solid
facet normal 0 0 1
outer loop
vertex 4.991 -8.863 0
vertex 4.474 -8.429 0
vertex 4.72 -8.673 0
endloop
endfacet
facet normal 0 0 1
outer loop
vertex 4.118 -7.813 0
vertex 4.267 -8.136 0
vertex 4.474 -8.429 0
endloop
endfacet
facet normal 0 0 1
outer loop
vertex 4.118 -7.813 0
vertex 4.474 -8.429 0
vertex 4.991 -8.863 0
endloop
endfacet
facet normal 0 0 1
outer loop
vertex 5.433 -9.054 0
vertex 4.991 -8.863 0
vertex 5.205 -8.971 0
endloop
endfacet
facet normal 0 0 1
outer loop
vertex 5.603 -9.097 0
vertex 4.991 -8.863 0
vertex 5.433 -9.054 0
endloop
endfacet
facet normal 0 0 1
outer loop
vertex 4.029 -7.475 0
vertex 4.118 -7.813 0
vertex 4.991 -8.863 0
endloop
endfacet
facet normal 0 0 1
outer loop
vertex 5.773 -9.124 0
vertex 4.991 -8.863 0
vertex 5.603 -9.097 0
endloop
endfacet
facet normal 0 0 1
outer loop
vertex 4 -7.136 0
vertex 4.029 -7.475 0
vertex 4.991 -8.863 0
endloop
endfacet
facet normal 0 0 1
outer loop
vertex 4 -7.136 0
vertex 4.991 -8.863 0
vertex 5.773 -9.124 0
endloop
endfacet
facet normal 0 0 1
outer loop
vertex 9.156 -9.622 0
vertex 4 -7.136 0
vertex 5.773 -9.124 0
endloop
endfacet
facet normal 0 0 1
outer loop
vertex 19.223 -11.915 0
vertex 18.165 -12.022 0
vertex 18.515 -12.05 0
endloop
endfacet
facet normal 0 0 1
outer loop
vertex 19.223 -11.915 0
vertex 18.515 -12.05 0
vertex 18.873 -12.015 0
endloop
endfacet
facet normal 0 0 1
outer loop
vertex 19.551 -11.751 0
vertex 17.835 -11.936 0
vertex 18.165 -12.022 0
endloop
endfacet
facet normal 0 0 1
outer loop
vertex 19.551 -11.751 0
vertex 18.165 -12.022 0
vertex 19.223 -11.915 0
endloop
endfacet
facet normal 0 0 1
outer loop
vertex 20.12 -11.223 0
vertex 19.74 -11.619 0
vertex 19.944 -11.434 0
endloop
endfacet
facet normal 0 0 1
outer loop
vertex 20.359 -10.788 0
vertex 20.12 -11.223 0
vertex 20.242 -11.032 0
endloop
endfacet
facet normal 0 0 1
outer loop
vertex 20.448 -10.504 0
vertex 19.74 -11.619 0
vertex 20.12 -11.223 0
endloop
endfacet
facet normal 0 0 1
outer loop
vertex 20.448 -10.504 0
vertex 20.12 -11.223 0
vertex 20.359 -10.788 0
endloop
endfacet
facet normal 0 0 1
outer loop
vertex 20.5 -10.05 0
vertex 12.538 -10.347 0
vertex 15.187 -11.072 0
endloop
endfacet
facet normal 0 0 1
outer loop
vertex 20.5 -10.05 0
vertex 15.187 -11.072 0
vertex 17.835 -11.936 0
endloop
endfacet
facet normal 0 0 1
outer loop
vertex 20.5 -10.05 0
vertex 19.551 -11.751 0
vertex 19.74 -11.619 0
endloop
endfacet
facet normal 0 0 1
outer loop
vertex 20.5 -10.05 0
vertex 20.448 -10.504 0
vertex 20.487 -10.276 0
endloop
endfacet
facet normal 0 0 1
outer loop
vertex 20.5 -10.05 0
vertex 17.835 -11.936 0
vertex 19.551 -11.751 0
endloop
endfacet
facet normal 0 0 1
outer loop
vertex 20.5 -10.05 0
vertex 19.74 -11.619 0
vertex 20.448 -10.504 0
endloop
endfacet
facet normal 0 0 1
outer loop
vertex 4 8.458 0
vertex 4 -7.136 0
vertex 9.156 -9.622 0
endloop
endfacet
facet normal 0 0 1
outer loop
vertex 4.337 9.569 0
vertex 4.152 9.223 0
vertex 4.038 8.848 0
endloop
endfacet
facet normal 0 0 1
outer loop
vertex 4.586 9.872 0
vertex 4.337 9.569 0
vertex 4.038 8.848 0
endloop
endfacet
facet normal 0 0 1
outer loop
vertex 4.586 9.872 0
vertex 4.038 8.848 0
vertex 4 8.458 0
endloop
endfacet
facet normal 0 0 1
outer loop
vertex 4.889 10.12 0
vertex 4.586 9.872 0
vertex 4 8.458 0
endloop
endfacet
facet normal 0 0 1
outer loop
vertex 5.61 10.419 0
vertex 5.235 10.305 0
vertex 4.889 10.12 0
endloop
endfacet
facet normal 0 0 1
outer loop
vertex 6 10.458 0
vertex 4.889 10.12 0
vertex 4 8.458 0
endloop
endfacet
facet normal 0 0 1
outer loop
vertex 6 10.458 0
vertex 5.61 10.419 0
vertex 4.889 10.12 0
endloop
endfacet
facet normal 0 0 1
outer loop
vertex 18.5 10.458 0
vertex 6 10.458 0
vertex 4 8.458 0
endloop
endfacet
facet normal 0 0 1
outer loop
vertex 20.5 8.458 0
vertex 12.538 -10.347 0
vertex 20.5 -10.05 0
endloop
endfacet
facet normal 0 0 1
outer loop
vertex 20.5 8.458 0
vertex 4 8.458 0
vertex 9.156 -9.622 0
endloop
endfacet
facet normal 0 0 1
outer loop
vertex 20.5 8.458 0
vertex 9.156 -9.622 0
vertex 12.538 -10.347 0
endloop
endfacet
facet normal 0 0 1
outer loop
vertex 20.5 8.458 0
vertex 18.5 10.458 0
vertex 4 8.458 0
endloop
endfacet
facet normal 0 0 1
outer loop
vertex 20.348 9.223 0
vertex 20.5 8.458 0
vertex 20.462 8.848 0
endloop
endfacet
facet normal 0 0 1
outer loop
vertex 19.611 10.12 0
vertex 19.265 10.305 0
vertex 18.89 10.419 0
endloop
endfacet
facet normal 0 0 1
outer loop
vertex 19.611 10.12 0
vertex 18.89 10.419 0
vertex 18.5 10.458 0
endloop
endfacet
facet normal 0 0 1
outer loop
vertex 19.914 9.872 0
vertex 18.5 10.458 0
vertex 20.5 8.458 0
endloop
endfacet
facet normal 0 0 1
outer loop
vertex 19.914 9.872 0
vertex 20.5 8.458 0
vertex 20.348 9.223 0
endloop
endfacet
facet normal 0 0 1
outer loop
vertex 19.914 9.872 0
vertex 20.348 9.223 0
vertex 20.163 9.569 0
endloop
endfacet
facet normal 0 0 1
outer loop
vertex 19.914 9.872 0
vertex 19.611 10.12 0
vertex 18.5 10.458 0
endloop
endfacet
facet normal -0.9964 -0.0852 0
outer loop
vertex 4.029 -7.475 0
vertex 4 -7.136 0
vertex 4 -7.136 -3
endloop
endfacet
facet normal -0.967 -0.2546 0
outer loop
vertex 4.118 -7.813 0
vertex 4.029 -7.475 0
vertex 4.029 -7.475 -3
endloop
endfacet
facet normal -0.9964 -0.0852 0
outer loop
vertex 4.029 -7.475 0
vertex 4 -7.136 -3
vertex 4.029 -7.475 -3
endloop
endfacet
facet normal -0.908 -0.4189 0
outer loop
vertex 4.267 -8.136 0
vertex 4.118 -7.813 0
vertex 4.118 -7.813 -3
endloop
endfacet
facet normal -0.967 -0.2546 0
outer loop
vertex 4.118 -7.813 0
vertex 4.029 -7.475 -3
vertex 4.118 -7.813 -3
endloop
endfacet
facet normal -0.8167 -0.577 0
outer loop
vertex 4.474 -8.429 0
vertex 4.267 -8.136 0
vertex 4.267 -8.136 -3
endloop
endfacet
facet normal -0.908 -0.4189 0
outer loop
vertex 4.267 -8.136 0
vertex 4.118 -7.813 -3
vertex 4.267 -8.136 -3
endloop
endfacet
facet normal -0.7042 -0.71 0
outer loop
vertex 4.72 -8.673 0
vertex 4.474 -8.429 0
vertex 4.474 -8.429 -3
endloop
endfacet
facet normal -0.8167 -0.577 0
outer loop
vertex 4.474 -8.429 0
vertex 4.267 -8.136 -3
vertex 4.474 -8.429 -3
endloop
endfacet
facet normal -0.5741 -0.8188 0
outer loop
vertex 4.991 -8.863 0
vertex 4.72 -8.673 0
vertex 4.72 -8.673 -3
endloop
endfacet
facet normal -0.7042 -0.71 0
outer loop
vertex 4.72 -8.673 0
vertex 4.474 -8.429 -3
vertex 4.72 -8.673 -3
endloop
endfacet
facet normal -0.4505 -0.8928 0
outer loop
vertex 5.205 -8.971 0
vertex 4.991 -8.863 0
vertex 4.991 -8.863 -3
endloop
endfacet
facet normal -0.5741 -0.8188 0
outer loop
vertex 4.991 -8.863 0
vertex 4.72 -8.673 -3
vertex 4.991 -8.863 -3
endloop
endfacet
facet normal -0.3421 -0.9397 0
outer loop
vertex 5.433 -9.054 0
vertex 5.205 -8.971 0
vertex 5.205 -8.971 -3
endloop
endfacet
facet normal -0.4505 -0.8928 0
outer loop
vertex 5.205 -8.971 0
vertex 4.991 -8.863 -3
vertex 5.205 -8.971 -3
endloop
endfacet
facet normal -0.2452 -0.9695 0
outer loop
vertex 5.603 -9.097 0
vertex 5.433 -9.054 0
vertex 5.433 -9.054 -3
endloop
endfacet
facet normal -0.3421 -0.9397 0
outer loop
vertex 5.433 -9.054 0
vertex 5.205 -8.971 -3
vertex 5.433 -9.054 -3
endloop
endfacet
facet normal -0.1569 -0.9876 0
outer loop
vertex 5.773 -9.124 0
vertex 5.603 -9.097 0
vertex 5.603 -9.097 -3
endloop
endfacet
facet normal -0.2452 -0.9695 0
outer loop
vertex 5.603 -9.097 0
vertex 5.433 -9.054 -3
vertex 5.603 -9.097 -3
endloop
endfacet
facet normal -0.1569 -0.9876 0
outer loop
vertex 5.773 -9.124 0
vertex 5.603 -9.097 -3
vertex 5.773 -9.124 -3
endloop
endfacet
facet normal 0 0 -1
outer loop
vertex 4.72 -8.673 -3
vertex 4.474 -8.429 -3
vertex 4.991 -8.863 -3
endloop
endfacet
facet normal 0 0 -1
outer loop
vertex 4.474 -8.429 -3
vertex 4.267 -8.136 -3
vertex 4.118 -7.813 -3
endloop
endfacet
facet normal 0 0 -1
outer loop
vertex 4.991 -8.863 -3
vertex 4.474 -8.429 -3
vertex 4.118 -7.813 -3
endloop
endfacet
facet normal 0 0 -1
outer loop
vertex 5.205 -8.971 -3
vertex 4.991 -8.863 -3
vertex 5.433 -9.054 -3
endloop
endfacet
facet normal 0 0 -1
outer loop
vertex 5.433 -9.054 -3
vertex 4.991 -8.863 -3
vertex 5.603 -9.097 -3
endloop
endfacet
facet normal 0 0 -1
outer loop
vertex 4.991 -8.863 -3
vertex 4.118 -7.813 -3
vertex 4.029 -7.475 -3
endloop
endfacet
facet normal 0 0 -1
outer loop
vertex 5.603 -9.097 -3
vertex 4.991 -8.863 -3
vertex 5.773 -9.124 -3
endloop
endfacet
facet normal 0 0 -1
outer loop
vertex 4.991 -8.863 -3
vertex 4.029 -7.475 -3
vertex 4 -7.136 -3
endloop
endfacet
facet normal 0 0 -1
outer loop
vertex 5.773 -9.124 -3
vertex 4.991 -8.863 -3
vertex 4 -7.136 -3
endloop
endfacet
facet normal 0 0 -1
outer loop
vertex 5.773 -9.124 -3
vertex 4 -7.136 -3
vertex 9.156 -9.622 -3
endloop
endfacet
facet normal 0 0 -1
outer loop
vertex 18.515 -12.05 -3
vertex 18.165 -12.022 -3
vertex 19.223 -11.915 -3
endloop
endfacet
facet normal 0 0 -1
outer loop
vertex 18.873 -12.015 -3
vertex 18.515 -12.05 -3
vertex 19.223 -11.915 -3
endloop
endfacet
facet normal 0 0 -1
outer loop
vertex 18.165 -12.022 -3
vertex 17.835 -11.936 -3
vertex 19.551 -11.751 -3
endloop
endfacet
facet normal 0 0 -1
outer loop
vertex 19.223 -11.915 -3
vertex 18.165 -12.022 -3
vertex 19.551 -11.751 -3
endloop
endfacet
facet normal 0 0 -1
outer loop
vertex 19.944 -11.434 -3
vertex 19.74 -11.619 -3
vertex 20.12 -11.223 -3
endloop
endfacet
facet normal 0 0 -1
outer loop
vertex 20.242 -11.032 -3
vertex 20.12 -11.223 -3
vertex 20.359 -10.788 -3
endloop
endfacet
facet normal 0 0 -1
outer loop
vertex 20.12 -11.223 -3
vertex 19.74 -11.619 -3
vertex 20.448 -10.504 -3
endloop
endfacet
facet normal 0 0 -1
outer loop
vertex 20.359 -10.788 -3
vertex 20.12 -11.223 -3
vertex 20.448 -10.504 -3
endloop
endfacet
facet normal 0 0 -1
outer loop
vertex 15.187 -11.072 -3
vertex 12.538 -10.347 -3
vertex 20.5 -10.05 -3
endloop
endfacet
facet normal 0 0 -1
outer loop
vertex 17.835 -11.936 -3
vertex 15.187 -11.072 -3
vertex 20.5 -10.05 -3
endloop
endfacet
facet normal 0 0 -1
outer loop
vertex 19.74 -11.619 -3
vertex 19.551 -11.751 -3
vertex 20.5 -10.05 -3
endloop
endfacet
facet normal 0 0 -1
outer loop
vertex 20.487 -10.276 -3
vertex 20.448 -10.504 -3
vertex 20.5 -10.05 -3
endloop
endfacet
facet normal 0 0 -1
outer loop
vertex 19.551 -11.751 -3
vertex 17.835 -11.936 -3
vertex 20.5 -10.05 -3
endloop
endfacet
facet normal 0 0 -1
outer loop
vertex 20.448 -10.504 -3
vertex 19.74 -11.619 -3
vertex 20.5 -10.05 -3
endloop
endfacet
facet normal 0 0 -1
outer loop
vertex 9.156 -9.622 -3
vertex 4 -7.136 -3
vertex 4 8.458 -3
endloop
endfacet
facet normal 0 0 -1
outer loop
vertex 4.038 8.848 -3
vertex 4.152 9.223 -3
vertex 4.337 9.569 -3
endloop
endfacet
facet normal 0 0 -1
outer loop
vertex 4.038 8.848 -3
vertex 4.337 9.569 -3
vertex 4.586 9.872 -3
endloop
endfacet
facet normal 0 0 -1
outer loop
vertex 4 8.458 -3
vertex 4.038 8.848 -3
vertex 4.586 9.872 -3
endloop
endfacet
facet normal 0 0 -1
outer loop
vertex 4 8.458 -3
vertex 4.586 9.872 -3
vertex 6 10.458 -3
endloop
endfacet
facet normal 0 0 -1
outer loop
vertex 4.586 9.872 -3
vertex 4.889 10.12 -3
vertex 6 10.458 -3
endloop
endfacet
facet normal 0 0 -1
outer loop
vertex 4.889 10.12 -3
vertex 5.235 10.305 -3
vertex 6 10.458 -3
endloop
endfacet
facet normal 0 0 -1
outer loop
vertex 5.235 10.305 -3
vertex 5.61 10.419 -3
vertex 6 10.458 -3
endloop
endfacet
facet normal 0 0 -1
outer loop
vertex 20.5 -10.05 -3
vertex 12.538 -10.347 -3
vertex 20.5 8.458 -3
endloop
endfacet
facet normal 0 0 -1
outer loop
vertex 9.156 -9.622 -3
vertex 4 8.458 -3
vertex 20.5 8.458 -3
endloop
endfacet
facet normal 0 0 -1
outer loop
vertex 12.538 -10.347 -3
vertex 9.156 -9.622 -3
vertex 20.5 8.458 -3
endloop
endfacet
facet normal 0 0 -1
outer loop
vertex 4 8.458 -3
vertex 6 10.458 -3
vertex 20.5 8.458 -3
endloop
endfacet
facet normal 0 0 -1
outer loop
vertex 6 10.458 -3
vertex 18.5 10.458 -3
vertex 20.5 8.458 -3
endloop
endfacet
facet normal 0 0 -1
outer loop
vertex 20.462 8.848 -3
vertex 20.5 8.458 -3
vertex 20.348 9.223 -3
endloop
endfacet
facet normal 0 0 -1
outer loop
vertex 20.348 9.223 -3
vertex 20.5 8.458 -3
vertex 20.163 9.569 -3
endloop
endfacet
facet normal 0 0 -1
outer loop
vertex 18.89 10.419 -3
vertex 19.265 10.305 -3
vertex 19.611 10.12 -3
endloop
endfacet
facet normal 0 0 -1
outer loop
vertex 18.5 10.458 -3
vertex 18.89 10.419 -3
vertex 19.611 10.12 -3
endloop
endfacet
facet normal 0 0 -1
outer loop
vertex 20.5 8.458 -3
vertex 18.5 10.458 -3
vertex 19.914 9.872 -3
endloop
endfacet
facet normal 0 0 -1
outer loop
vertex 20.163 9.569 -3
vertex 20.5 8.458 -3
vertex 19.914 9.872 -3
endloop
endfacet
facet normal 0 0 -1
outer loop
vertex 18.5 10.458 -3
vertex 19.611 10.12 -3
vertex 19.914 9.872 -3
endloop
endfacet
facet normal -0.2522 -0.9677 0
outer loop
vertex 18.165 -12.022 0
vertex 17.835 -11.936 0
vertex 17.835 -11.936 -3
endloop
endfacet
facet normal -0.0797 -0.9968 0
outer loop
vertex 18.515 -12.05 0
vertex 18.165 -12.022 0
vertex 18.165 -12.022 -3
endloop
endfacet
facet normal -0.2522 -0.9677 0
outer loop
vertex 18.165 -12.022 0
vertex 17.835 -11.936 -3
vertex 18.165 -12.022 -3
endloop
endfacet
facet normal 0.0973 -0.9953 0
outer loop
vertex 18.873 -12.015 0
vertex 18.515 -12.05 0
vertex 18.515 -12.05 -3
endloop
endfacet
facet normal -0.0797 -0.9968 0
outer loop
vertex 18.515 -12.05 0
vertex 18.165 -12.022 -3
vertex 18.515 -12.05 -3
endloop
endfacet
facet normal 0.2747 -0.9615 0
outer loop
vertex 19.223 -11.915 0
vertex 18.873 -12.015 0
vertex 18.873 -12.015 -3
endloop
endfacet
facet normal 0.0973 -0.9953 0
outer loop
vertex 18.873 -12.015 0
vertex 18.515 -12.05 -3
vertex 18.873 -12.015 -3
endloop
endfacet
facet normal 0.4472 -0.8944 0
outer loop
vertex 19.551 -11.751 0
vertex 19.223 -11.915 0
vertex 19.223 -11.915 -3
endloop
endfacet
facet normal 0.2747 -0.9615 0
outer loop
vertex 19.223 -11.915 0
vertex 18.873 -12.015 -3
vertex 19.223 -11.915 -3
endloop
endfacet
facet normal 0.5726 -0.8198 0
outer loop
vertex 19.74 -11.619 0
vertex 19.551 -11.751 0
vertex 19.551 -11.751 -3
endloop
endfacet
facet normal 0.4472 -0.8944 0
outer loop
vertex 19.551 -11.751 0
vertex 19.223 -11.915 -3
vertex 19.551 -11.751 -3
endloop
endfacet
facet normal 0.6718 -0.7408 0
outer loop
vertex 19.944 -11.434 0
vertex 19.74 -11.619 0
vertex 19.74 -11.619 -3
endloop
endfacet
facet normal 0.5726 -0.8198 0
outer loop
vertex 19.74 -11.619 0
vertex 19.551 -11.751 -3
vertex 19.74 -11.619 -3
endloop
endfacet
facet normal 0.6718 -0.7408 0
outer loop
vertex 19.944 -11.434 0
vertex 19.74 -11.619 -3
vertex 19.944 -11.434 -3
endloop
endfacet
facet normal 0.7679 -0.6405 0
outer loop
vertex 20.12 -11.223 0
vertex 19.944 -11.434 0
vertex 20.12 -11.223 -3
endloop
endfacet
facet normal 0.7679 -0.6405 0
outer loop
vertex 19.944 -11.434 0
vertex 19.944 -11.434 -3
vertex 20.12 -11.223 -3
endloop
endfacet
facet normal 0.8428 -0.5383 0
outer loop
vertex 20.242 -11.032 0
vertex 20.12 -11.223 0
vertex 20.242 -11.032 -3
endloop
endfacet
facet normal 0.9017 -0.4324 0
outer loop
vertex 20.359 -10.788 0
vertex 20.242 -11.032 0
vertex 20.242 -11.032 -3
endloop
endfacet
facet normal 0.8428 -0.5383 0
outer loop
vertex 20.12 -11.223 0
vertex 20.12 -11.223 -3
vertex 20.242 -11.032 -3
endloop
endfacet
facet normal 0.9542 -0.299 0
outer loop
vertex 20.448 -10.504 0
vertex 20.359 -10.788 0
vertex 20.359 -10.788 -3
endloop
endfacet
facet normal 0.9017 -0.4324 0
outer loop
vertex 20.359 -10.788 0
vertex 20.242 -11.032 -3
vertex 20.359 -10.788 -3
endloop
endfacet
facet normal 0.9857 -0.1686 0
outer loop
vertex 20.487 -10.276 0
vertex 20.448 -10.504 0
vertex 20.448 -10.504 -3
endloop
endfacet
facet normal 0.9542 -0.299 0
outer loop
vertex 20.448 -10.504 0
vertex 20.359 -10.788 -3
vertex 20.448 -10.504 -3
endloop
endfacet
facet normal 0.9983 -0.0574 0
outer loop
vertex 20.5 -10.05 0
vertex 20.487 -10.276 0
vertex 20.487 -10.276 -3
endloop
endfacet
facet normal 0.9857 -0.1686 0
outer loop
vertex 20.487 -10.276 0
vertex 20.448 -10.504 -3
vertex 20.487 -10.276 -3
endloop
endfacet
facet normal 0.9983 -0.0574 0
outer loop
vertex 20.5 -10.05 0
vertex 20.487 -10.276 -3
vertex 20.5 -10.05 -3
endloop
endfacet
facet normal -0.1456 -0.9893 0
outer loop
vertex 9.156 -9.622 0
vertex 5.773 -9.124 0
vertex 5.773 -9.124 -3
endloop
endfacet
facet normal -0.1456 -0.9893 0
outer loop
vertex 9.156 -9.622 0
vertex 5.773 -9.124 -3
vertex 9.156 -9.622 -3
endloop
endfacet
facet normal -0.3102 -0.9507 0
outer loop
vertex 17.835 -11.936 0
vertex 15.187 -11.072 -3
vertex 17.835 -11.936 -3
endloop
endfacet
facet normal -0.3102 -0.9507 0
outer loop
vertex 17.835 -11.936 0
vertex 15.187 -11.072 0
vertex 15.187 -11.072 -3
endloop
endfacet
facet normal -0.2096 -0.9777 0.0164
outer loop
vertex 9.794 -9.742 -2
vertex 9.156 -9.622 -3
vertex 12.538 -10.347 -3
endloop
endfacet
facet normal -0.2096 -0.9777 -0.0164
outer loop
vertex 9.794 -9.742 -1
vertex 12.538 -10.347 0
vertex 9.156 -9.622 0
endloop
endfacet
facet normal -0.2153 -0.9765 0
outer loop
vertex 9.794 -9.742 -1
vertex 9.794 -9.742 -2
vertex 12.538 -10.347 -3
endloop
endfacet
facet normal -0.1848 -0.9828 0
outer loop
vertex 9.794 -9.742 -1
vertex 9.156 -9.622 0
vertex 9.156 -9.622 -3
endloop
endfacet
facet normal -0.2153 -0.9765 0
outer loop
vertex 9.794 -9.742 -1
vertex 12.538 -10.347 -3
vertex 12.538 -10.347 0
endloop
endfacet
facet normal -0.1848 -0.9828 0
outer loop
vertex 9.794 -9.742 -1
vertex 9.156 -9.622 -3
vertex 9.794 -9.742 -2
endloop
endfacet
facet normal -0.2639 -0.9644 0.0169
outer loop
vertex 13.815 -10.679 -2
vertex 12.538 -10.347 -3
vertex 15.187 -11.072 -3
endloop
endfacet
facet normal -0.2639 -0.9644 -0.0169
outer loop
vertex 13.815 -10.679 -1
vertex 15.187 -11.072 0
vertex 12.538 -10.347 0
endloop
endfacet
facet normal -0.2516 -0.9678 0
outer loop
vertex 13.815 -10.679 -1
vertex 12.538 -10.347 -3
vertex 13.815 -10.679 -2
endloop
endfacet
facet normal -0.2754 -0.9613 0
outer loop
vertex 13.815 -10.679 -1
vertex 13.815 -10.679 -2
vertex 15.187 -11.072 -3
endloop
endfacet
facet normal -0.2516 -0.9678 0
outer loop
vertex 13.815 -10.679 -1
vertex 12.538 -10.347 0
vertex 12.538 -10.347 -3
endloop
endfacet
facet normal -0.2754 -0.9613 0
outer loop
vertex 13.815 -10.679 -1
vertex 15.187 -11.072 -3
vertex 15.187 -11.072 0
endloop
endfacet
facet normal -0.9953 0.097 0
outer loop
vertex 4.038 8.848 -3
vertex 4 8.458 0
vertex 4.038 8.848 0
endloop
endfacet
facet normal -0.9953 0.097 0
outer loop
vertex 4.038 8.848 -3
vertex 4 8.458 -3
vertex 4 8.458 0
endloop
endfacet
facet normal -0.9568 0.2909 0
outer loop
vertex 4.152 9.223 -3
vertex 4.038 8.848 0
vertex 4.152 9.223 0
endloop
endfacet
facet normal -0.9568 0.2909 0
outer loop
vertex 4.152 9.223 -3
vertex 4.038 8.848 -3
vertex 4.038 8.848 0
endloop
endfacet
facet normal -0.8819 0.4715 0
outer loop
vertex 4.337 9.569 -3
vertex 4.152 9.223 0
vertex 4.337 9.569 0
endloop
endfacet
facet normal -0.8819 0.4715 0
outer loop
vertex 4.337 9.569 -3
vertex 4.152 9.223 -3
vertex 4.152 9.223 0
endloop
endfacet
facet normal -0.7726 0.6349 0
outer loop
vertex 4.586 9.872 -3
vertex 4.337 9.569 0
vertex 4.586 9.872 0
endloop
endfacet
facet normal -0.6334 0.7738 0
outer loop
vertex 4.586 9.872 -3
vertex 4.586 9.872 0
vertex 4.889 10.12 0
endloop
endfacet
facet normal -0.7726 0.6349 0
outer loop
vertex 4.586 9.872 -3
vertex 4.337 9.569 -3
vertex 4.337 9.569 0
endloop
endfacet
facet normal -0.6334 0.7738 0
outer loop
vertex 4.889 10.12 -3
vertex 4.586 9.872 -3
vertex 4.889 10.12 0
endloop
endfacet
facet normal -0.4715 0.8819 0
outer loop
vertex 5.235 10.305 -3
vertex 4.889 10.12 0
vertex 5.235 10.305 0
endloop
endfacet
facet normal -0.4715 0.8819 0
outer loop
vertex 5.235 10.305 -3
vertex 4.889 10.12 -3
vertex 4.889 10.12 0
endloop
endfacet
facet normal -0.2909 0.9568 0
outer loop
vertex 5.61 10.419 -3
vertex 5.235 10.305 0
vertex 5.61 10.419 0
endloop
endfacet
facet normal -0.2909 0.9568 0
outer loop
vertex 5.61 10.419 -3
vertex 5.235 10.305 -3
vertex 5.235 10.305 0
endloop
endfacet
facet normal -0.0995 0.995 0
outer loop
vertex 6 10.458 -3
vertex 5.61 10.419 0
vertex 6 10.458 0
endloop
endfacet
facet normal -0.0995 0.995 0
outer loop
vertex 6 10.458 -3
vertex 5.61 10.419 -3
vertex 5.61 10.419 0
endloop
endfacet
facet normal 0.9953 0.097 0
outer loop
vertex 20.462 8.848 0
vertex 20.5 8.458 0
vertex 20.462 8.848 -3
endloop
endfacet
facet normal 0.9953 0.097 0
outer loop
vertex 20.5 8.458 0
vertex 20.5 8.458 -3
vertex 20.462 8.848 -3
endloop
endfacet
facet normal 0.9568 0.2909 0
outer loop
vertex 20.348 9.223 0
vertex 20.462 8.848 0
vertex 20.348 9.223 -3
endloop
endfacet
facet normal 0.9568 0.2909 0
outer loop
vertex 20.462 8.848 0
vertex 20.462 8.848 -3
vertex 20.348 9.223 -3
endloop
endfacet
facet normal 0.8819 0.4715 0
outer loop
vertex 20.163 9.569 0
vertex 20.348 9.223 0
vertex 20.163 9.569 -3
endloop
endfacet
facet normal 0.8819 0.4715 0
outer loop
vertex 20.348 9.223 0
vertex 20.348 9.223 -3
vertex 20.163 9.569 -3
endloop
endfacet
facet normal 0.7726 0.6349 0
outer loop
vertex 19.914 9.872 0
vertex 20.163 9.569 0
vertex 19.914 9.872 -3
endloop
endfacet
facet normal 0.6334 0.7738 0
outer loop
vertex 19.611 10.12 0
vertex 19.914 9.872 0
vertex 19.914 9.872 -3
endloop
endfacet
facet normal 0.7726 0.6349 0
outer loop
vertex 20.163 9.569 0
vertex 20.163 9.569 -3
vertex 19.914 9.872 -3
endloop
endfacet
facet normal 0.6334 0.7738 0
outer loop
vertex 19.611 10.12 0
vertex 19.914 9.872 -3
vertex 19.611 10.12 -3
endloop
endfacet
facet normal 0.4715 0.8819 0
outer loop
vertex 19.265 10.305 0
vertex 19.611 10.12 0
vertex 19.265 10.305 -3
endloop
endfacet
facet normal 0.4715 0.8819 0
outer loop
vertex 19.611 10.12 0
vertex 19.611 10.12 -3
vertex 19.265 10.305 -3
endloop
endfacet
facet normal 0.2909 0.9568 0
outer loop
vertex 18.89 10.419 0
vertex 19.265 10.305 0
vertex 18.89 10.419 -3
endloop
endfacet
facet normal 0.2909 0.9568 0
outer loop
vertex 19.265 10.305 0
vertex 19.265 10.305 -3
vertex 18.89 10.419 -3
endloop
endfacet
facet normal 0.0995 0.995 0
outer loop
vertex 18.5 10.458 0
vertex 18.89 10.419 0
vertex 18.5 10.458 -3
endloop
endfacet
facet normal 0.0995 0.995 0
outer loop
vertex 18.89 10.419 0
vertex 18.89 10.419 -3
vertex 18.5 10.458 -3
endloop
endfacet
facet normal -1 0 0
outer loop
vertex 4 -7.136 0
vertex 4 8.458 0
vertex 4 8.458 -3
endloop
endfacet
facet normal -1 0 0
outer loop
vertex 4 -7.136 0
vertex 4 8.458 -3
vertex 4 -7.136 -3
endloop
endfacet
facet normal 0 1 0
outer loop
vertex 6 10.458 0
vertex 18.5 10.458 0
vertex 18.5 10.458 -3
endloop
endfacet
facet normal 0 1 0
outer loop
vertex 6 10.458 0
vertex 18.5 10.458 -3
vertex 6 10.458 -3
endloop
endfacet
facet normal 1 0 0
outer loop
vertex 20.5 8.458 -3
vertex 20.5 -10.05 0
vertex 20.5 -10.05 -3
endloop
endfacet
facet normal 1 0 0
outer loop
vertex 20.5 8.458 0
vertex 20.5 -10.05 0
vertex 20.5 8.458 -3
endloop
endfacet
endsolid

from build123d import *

# Parameters (mm, degrees)
BOSS_EXTRUDE1_DEPTH = 3
FILLET1_R           = 2


with BuildPart() as part:
    # Sketch2 → Boss-Extrude1 (new body)
    with BuildSketch(Plane.XY):
        with BuildLine():
            Line((4, 10.457560668), (4, -8.952439332))
            add(Edge.make_bspline(
                [(4, -8.952439332), (9.5, -9.387007233), (15, -10.717871431), (20.5, -12.945031924)],
                knots=[0.588888889, 0.588888889, 0.588888889, 0.588888889, 0.955555556, 0.955555556, 0.955555556, 0.955555556], degree=3))
            Line((20.5, -12.945031924), (20.5, 10.457560668))
            Line((20.5, 10.457560668), (4, 10.457560668))
        make_face()
    extrude(amount=-BOSS_EXTRUDE1_DEPTH)

    # Fillet1
    fillet1_edges = [part.edges().sort_by_distance(p)[0] for p in [
        (20.5, -12.945031924, -1.5),
        (4, -8.952439332, -1.5),
        (20.5, 10.457560668, -1.5),
        (4, 10.457560668, -1.5),
    ]]
    fillet(fillet1_edges, radius=FILLET1_R)


solid = part.part
